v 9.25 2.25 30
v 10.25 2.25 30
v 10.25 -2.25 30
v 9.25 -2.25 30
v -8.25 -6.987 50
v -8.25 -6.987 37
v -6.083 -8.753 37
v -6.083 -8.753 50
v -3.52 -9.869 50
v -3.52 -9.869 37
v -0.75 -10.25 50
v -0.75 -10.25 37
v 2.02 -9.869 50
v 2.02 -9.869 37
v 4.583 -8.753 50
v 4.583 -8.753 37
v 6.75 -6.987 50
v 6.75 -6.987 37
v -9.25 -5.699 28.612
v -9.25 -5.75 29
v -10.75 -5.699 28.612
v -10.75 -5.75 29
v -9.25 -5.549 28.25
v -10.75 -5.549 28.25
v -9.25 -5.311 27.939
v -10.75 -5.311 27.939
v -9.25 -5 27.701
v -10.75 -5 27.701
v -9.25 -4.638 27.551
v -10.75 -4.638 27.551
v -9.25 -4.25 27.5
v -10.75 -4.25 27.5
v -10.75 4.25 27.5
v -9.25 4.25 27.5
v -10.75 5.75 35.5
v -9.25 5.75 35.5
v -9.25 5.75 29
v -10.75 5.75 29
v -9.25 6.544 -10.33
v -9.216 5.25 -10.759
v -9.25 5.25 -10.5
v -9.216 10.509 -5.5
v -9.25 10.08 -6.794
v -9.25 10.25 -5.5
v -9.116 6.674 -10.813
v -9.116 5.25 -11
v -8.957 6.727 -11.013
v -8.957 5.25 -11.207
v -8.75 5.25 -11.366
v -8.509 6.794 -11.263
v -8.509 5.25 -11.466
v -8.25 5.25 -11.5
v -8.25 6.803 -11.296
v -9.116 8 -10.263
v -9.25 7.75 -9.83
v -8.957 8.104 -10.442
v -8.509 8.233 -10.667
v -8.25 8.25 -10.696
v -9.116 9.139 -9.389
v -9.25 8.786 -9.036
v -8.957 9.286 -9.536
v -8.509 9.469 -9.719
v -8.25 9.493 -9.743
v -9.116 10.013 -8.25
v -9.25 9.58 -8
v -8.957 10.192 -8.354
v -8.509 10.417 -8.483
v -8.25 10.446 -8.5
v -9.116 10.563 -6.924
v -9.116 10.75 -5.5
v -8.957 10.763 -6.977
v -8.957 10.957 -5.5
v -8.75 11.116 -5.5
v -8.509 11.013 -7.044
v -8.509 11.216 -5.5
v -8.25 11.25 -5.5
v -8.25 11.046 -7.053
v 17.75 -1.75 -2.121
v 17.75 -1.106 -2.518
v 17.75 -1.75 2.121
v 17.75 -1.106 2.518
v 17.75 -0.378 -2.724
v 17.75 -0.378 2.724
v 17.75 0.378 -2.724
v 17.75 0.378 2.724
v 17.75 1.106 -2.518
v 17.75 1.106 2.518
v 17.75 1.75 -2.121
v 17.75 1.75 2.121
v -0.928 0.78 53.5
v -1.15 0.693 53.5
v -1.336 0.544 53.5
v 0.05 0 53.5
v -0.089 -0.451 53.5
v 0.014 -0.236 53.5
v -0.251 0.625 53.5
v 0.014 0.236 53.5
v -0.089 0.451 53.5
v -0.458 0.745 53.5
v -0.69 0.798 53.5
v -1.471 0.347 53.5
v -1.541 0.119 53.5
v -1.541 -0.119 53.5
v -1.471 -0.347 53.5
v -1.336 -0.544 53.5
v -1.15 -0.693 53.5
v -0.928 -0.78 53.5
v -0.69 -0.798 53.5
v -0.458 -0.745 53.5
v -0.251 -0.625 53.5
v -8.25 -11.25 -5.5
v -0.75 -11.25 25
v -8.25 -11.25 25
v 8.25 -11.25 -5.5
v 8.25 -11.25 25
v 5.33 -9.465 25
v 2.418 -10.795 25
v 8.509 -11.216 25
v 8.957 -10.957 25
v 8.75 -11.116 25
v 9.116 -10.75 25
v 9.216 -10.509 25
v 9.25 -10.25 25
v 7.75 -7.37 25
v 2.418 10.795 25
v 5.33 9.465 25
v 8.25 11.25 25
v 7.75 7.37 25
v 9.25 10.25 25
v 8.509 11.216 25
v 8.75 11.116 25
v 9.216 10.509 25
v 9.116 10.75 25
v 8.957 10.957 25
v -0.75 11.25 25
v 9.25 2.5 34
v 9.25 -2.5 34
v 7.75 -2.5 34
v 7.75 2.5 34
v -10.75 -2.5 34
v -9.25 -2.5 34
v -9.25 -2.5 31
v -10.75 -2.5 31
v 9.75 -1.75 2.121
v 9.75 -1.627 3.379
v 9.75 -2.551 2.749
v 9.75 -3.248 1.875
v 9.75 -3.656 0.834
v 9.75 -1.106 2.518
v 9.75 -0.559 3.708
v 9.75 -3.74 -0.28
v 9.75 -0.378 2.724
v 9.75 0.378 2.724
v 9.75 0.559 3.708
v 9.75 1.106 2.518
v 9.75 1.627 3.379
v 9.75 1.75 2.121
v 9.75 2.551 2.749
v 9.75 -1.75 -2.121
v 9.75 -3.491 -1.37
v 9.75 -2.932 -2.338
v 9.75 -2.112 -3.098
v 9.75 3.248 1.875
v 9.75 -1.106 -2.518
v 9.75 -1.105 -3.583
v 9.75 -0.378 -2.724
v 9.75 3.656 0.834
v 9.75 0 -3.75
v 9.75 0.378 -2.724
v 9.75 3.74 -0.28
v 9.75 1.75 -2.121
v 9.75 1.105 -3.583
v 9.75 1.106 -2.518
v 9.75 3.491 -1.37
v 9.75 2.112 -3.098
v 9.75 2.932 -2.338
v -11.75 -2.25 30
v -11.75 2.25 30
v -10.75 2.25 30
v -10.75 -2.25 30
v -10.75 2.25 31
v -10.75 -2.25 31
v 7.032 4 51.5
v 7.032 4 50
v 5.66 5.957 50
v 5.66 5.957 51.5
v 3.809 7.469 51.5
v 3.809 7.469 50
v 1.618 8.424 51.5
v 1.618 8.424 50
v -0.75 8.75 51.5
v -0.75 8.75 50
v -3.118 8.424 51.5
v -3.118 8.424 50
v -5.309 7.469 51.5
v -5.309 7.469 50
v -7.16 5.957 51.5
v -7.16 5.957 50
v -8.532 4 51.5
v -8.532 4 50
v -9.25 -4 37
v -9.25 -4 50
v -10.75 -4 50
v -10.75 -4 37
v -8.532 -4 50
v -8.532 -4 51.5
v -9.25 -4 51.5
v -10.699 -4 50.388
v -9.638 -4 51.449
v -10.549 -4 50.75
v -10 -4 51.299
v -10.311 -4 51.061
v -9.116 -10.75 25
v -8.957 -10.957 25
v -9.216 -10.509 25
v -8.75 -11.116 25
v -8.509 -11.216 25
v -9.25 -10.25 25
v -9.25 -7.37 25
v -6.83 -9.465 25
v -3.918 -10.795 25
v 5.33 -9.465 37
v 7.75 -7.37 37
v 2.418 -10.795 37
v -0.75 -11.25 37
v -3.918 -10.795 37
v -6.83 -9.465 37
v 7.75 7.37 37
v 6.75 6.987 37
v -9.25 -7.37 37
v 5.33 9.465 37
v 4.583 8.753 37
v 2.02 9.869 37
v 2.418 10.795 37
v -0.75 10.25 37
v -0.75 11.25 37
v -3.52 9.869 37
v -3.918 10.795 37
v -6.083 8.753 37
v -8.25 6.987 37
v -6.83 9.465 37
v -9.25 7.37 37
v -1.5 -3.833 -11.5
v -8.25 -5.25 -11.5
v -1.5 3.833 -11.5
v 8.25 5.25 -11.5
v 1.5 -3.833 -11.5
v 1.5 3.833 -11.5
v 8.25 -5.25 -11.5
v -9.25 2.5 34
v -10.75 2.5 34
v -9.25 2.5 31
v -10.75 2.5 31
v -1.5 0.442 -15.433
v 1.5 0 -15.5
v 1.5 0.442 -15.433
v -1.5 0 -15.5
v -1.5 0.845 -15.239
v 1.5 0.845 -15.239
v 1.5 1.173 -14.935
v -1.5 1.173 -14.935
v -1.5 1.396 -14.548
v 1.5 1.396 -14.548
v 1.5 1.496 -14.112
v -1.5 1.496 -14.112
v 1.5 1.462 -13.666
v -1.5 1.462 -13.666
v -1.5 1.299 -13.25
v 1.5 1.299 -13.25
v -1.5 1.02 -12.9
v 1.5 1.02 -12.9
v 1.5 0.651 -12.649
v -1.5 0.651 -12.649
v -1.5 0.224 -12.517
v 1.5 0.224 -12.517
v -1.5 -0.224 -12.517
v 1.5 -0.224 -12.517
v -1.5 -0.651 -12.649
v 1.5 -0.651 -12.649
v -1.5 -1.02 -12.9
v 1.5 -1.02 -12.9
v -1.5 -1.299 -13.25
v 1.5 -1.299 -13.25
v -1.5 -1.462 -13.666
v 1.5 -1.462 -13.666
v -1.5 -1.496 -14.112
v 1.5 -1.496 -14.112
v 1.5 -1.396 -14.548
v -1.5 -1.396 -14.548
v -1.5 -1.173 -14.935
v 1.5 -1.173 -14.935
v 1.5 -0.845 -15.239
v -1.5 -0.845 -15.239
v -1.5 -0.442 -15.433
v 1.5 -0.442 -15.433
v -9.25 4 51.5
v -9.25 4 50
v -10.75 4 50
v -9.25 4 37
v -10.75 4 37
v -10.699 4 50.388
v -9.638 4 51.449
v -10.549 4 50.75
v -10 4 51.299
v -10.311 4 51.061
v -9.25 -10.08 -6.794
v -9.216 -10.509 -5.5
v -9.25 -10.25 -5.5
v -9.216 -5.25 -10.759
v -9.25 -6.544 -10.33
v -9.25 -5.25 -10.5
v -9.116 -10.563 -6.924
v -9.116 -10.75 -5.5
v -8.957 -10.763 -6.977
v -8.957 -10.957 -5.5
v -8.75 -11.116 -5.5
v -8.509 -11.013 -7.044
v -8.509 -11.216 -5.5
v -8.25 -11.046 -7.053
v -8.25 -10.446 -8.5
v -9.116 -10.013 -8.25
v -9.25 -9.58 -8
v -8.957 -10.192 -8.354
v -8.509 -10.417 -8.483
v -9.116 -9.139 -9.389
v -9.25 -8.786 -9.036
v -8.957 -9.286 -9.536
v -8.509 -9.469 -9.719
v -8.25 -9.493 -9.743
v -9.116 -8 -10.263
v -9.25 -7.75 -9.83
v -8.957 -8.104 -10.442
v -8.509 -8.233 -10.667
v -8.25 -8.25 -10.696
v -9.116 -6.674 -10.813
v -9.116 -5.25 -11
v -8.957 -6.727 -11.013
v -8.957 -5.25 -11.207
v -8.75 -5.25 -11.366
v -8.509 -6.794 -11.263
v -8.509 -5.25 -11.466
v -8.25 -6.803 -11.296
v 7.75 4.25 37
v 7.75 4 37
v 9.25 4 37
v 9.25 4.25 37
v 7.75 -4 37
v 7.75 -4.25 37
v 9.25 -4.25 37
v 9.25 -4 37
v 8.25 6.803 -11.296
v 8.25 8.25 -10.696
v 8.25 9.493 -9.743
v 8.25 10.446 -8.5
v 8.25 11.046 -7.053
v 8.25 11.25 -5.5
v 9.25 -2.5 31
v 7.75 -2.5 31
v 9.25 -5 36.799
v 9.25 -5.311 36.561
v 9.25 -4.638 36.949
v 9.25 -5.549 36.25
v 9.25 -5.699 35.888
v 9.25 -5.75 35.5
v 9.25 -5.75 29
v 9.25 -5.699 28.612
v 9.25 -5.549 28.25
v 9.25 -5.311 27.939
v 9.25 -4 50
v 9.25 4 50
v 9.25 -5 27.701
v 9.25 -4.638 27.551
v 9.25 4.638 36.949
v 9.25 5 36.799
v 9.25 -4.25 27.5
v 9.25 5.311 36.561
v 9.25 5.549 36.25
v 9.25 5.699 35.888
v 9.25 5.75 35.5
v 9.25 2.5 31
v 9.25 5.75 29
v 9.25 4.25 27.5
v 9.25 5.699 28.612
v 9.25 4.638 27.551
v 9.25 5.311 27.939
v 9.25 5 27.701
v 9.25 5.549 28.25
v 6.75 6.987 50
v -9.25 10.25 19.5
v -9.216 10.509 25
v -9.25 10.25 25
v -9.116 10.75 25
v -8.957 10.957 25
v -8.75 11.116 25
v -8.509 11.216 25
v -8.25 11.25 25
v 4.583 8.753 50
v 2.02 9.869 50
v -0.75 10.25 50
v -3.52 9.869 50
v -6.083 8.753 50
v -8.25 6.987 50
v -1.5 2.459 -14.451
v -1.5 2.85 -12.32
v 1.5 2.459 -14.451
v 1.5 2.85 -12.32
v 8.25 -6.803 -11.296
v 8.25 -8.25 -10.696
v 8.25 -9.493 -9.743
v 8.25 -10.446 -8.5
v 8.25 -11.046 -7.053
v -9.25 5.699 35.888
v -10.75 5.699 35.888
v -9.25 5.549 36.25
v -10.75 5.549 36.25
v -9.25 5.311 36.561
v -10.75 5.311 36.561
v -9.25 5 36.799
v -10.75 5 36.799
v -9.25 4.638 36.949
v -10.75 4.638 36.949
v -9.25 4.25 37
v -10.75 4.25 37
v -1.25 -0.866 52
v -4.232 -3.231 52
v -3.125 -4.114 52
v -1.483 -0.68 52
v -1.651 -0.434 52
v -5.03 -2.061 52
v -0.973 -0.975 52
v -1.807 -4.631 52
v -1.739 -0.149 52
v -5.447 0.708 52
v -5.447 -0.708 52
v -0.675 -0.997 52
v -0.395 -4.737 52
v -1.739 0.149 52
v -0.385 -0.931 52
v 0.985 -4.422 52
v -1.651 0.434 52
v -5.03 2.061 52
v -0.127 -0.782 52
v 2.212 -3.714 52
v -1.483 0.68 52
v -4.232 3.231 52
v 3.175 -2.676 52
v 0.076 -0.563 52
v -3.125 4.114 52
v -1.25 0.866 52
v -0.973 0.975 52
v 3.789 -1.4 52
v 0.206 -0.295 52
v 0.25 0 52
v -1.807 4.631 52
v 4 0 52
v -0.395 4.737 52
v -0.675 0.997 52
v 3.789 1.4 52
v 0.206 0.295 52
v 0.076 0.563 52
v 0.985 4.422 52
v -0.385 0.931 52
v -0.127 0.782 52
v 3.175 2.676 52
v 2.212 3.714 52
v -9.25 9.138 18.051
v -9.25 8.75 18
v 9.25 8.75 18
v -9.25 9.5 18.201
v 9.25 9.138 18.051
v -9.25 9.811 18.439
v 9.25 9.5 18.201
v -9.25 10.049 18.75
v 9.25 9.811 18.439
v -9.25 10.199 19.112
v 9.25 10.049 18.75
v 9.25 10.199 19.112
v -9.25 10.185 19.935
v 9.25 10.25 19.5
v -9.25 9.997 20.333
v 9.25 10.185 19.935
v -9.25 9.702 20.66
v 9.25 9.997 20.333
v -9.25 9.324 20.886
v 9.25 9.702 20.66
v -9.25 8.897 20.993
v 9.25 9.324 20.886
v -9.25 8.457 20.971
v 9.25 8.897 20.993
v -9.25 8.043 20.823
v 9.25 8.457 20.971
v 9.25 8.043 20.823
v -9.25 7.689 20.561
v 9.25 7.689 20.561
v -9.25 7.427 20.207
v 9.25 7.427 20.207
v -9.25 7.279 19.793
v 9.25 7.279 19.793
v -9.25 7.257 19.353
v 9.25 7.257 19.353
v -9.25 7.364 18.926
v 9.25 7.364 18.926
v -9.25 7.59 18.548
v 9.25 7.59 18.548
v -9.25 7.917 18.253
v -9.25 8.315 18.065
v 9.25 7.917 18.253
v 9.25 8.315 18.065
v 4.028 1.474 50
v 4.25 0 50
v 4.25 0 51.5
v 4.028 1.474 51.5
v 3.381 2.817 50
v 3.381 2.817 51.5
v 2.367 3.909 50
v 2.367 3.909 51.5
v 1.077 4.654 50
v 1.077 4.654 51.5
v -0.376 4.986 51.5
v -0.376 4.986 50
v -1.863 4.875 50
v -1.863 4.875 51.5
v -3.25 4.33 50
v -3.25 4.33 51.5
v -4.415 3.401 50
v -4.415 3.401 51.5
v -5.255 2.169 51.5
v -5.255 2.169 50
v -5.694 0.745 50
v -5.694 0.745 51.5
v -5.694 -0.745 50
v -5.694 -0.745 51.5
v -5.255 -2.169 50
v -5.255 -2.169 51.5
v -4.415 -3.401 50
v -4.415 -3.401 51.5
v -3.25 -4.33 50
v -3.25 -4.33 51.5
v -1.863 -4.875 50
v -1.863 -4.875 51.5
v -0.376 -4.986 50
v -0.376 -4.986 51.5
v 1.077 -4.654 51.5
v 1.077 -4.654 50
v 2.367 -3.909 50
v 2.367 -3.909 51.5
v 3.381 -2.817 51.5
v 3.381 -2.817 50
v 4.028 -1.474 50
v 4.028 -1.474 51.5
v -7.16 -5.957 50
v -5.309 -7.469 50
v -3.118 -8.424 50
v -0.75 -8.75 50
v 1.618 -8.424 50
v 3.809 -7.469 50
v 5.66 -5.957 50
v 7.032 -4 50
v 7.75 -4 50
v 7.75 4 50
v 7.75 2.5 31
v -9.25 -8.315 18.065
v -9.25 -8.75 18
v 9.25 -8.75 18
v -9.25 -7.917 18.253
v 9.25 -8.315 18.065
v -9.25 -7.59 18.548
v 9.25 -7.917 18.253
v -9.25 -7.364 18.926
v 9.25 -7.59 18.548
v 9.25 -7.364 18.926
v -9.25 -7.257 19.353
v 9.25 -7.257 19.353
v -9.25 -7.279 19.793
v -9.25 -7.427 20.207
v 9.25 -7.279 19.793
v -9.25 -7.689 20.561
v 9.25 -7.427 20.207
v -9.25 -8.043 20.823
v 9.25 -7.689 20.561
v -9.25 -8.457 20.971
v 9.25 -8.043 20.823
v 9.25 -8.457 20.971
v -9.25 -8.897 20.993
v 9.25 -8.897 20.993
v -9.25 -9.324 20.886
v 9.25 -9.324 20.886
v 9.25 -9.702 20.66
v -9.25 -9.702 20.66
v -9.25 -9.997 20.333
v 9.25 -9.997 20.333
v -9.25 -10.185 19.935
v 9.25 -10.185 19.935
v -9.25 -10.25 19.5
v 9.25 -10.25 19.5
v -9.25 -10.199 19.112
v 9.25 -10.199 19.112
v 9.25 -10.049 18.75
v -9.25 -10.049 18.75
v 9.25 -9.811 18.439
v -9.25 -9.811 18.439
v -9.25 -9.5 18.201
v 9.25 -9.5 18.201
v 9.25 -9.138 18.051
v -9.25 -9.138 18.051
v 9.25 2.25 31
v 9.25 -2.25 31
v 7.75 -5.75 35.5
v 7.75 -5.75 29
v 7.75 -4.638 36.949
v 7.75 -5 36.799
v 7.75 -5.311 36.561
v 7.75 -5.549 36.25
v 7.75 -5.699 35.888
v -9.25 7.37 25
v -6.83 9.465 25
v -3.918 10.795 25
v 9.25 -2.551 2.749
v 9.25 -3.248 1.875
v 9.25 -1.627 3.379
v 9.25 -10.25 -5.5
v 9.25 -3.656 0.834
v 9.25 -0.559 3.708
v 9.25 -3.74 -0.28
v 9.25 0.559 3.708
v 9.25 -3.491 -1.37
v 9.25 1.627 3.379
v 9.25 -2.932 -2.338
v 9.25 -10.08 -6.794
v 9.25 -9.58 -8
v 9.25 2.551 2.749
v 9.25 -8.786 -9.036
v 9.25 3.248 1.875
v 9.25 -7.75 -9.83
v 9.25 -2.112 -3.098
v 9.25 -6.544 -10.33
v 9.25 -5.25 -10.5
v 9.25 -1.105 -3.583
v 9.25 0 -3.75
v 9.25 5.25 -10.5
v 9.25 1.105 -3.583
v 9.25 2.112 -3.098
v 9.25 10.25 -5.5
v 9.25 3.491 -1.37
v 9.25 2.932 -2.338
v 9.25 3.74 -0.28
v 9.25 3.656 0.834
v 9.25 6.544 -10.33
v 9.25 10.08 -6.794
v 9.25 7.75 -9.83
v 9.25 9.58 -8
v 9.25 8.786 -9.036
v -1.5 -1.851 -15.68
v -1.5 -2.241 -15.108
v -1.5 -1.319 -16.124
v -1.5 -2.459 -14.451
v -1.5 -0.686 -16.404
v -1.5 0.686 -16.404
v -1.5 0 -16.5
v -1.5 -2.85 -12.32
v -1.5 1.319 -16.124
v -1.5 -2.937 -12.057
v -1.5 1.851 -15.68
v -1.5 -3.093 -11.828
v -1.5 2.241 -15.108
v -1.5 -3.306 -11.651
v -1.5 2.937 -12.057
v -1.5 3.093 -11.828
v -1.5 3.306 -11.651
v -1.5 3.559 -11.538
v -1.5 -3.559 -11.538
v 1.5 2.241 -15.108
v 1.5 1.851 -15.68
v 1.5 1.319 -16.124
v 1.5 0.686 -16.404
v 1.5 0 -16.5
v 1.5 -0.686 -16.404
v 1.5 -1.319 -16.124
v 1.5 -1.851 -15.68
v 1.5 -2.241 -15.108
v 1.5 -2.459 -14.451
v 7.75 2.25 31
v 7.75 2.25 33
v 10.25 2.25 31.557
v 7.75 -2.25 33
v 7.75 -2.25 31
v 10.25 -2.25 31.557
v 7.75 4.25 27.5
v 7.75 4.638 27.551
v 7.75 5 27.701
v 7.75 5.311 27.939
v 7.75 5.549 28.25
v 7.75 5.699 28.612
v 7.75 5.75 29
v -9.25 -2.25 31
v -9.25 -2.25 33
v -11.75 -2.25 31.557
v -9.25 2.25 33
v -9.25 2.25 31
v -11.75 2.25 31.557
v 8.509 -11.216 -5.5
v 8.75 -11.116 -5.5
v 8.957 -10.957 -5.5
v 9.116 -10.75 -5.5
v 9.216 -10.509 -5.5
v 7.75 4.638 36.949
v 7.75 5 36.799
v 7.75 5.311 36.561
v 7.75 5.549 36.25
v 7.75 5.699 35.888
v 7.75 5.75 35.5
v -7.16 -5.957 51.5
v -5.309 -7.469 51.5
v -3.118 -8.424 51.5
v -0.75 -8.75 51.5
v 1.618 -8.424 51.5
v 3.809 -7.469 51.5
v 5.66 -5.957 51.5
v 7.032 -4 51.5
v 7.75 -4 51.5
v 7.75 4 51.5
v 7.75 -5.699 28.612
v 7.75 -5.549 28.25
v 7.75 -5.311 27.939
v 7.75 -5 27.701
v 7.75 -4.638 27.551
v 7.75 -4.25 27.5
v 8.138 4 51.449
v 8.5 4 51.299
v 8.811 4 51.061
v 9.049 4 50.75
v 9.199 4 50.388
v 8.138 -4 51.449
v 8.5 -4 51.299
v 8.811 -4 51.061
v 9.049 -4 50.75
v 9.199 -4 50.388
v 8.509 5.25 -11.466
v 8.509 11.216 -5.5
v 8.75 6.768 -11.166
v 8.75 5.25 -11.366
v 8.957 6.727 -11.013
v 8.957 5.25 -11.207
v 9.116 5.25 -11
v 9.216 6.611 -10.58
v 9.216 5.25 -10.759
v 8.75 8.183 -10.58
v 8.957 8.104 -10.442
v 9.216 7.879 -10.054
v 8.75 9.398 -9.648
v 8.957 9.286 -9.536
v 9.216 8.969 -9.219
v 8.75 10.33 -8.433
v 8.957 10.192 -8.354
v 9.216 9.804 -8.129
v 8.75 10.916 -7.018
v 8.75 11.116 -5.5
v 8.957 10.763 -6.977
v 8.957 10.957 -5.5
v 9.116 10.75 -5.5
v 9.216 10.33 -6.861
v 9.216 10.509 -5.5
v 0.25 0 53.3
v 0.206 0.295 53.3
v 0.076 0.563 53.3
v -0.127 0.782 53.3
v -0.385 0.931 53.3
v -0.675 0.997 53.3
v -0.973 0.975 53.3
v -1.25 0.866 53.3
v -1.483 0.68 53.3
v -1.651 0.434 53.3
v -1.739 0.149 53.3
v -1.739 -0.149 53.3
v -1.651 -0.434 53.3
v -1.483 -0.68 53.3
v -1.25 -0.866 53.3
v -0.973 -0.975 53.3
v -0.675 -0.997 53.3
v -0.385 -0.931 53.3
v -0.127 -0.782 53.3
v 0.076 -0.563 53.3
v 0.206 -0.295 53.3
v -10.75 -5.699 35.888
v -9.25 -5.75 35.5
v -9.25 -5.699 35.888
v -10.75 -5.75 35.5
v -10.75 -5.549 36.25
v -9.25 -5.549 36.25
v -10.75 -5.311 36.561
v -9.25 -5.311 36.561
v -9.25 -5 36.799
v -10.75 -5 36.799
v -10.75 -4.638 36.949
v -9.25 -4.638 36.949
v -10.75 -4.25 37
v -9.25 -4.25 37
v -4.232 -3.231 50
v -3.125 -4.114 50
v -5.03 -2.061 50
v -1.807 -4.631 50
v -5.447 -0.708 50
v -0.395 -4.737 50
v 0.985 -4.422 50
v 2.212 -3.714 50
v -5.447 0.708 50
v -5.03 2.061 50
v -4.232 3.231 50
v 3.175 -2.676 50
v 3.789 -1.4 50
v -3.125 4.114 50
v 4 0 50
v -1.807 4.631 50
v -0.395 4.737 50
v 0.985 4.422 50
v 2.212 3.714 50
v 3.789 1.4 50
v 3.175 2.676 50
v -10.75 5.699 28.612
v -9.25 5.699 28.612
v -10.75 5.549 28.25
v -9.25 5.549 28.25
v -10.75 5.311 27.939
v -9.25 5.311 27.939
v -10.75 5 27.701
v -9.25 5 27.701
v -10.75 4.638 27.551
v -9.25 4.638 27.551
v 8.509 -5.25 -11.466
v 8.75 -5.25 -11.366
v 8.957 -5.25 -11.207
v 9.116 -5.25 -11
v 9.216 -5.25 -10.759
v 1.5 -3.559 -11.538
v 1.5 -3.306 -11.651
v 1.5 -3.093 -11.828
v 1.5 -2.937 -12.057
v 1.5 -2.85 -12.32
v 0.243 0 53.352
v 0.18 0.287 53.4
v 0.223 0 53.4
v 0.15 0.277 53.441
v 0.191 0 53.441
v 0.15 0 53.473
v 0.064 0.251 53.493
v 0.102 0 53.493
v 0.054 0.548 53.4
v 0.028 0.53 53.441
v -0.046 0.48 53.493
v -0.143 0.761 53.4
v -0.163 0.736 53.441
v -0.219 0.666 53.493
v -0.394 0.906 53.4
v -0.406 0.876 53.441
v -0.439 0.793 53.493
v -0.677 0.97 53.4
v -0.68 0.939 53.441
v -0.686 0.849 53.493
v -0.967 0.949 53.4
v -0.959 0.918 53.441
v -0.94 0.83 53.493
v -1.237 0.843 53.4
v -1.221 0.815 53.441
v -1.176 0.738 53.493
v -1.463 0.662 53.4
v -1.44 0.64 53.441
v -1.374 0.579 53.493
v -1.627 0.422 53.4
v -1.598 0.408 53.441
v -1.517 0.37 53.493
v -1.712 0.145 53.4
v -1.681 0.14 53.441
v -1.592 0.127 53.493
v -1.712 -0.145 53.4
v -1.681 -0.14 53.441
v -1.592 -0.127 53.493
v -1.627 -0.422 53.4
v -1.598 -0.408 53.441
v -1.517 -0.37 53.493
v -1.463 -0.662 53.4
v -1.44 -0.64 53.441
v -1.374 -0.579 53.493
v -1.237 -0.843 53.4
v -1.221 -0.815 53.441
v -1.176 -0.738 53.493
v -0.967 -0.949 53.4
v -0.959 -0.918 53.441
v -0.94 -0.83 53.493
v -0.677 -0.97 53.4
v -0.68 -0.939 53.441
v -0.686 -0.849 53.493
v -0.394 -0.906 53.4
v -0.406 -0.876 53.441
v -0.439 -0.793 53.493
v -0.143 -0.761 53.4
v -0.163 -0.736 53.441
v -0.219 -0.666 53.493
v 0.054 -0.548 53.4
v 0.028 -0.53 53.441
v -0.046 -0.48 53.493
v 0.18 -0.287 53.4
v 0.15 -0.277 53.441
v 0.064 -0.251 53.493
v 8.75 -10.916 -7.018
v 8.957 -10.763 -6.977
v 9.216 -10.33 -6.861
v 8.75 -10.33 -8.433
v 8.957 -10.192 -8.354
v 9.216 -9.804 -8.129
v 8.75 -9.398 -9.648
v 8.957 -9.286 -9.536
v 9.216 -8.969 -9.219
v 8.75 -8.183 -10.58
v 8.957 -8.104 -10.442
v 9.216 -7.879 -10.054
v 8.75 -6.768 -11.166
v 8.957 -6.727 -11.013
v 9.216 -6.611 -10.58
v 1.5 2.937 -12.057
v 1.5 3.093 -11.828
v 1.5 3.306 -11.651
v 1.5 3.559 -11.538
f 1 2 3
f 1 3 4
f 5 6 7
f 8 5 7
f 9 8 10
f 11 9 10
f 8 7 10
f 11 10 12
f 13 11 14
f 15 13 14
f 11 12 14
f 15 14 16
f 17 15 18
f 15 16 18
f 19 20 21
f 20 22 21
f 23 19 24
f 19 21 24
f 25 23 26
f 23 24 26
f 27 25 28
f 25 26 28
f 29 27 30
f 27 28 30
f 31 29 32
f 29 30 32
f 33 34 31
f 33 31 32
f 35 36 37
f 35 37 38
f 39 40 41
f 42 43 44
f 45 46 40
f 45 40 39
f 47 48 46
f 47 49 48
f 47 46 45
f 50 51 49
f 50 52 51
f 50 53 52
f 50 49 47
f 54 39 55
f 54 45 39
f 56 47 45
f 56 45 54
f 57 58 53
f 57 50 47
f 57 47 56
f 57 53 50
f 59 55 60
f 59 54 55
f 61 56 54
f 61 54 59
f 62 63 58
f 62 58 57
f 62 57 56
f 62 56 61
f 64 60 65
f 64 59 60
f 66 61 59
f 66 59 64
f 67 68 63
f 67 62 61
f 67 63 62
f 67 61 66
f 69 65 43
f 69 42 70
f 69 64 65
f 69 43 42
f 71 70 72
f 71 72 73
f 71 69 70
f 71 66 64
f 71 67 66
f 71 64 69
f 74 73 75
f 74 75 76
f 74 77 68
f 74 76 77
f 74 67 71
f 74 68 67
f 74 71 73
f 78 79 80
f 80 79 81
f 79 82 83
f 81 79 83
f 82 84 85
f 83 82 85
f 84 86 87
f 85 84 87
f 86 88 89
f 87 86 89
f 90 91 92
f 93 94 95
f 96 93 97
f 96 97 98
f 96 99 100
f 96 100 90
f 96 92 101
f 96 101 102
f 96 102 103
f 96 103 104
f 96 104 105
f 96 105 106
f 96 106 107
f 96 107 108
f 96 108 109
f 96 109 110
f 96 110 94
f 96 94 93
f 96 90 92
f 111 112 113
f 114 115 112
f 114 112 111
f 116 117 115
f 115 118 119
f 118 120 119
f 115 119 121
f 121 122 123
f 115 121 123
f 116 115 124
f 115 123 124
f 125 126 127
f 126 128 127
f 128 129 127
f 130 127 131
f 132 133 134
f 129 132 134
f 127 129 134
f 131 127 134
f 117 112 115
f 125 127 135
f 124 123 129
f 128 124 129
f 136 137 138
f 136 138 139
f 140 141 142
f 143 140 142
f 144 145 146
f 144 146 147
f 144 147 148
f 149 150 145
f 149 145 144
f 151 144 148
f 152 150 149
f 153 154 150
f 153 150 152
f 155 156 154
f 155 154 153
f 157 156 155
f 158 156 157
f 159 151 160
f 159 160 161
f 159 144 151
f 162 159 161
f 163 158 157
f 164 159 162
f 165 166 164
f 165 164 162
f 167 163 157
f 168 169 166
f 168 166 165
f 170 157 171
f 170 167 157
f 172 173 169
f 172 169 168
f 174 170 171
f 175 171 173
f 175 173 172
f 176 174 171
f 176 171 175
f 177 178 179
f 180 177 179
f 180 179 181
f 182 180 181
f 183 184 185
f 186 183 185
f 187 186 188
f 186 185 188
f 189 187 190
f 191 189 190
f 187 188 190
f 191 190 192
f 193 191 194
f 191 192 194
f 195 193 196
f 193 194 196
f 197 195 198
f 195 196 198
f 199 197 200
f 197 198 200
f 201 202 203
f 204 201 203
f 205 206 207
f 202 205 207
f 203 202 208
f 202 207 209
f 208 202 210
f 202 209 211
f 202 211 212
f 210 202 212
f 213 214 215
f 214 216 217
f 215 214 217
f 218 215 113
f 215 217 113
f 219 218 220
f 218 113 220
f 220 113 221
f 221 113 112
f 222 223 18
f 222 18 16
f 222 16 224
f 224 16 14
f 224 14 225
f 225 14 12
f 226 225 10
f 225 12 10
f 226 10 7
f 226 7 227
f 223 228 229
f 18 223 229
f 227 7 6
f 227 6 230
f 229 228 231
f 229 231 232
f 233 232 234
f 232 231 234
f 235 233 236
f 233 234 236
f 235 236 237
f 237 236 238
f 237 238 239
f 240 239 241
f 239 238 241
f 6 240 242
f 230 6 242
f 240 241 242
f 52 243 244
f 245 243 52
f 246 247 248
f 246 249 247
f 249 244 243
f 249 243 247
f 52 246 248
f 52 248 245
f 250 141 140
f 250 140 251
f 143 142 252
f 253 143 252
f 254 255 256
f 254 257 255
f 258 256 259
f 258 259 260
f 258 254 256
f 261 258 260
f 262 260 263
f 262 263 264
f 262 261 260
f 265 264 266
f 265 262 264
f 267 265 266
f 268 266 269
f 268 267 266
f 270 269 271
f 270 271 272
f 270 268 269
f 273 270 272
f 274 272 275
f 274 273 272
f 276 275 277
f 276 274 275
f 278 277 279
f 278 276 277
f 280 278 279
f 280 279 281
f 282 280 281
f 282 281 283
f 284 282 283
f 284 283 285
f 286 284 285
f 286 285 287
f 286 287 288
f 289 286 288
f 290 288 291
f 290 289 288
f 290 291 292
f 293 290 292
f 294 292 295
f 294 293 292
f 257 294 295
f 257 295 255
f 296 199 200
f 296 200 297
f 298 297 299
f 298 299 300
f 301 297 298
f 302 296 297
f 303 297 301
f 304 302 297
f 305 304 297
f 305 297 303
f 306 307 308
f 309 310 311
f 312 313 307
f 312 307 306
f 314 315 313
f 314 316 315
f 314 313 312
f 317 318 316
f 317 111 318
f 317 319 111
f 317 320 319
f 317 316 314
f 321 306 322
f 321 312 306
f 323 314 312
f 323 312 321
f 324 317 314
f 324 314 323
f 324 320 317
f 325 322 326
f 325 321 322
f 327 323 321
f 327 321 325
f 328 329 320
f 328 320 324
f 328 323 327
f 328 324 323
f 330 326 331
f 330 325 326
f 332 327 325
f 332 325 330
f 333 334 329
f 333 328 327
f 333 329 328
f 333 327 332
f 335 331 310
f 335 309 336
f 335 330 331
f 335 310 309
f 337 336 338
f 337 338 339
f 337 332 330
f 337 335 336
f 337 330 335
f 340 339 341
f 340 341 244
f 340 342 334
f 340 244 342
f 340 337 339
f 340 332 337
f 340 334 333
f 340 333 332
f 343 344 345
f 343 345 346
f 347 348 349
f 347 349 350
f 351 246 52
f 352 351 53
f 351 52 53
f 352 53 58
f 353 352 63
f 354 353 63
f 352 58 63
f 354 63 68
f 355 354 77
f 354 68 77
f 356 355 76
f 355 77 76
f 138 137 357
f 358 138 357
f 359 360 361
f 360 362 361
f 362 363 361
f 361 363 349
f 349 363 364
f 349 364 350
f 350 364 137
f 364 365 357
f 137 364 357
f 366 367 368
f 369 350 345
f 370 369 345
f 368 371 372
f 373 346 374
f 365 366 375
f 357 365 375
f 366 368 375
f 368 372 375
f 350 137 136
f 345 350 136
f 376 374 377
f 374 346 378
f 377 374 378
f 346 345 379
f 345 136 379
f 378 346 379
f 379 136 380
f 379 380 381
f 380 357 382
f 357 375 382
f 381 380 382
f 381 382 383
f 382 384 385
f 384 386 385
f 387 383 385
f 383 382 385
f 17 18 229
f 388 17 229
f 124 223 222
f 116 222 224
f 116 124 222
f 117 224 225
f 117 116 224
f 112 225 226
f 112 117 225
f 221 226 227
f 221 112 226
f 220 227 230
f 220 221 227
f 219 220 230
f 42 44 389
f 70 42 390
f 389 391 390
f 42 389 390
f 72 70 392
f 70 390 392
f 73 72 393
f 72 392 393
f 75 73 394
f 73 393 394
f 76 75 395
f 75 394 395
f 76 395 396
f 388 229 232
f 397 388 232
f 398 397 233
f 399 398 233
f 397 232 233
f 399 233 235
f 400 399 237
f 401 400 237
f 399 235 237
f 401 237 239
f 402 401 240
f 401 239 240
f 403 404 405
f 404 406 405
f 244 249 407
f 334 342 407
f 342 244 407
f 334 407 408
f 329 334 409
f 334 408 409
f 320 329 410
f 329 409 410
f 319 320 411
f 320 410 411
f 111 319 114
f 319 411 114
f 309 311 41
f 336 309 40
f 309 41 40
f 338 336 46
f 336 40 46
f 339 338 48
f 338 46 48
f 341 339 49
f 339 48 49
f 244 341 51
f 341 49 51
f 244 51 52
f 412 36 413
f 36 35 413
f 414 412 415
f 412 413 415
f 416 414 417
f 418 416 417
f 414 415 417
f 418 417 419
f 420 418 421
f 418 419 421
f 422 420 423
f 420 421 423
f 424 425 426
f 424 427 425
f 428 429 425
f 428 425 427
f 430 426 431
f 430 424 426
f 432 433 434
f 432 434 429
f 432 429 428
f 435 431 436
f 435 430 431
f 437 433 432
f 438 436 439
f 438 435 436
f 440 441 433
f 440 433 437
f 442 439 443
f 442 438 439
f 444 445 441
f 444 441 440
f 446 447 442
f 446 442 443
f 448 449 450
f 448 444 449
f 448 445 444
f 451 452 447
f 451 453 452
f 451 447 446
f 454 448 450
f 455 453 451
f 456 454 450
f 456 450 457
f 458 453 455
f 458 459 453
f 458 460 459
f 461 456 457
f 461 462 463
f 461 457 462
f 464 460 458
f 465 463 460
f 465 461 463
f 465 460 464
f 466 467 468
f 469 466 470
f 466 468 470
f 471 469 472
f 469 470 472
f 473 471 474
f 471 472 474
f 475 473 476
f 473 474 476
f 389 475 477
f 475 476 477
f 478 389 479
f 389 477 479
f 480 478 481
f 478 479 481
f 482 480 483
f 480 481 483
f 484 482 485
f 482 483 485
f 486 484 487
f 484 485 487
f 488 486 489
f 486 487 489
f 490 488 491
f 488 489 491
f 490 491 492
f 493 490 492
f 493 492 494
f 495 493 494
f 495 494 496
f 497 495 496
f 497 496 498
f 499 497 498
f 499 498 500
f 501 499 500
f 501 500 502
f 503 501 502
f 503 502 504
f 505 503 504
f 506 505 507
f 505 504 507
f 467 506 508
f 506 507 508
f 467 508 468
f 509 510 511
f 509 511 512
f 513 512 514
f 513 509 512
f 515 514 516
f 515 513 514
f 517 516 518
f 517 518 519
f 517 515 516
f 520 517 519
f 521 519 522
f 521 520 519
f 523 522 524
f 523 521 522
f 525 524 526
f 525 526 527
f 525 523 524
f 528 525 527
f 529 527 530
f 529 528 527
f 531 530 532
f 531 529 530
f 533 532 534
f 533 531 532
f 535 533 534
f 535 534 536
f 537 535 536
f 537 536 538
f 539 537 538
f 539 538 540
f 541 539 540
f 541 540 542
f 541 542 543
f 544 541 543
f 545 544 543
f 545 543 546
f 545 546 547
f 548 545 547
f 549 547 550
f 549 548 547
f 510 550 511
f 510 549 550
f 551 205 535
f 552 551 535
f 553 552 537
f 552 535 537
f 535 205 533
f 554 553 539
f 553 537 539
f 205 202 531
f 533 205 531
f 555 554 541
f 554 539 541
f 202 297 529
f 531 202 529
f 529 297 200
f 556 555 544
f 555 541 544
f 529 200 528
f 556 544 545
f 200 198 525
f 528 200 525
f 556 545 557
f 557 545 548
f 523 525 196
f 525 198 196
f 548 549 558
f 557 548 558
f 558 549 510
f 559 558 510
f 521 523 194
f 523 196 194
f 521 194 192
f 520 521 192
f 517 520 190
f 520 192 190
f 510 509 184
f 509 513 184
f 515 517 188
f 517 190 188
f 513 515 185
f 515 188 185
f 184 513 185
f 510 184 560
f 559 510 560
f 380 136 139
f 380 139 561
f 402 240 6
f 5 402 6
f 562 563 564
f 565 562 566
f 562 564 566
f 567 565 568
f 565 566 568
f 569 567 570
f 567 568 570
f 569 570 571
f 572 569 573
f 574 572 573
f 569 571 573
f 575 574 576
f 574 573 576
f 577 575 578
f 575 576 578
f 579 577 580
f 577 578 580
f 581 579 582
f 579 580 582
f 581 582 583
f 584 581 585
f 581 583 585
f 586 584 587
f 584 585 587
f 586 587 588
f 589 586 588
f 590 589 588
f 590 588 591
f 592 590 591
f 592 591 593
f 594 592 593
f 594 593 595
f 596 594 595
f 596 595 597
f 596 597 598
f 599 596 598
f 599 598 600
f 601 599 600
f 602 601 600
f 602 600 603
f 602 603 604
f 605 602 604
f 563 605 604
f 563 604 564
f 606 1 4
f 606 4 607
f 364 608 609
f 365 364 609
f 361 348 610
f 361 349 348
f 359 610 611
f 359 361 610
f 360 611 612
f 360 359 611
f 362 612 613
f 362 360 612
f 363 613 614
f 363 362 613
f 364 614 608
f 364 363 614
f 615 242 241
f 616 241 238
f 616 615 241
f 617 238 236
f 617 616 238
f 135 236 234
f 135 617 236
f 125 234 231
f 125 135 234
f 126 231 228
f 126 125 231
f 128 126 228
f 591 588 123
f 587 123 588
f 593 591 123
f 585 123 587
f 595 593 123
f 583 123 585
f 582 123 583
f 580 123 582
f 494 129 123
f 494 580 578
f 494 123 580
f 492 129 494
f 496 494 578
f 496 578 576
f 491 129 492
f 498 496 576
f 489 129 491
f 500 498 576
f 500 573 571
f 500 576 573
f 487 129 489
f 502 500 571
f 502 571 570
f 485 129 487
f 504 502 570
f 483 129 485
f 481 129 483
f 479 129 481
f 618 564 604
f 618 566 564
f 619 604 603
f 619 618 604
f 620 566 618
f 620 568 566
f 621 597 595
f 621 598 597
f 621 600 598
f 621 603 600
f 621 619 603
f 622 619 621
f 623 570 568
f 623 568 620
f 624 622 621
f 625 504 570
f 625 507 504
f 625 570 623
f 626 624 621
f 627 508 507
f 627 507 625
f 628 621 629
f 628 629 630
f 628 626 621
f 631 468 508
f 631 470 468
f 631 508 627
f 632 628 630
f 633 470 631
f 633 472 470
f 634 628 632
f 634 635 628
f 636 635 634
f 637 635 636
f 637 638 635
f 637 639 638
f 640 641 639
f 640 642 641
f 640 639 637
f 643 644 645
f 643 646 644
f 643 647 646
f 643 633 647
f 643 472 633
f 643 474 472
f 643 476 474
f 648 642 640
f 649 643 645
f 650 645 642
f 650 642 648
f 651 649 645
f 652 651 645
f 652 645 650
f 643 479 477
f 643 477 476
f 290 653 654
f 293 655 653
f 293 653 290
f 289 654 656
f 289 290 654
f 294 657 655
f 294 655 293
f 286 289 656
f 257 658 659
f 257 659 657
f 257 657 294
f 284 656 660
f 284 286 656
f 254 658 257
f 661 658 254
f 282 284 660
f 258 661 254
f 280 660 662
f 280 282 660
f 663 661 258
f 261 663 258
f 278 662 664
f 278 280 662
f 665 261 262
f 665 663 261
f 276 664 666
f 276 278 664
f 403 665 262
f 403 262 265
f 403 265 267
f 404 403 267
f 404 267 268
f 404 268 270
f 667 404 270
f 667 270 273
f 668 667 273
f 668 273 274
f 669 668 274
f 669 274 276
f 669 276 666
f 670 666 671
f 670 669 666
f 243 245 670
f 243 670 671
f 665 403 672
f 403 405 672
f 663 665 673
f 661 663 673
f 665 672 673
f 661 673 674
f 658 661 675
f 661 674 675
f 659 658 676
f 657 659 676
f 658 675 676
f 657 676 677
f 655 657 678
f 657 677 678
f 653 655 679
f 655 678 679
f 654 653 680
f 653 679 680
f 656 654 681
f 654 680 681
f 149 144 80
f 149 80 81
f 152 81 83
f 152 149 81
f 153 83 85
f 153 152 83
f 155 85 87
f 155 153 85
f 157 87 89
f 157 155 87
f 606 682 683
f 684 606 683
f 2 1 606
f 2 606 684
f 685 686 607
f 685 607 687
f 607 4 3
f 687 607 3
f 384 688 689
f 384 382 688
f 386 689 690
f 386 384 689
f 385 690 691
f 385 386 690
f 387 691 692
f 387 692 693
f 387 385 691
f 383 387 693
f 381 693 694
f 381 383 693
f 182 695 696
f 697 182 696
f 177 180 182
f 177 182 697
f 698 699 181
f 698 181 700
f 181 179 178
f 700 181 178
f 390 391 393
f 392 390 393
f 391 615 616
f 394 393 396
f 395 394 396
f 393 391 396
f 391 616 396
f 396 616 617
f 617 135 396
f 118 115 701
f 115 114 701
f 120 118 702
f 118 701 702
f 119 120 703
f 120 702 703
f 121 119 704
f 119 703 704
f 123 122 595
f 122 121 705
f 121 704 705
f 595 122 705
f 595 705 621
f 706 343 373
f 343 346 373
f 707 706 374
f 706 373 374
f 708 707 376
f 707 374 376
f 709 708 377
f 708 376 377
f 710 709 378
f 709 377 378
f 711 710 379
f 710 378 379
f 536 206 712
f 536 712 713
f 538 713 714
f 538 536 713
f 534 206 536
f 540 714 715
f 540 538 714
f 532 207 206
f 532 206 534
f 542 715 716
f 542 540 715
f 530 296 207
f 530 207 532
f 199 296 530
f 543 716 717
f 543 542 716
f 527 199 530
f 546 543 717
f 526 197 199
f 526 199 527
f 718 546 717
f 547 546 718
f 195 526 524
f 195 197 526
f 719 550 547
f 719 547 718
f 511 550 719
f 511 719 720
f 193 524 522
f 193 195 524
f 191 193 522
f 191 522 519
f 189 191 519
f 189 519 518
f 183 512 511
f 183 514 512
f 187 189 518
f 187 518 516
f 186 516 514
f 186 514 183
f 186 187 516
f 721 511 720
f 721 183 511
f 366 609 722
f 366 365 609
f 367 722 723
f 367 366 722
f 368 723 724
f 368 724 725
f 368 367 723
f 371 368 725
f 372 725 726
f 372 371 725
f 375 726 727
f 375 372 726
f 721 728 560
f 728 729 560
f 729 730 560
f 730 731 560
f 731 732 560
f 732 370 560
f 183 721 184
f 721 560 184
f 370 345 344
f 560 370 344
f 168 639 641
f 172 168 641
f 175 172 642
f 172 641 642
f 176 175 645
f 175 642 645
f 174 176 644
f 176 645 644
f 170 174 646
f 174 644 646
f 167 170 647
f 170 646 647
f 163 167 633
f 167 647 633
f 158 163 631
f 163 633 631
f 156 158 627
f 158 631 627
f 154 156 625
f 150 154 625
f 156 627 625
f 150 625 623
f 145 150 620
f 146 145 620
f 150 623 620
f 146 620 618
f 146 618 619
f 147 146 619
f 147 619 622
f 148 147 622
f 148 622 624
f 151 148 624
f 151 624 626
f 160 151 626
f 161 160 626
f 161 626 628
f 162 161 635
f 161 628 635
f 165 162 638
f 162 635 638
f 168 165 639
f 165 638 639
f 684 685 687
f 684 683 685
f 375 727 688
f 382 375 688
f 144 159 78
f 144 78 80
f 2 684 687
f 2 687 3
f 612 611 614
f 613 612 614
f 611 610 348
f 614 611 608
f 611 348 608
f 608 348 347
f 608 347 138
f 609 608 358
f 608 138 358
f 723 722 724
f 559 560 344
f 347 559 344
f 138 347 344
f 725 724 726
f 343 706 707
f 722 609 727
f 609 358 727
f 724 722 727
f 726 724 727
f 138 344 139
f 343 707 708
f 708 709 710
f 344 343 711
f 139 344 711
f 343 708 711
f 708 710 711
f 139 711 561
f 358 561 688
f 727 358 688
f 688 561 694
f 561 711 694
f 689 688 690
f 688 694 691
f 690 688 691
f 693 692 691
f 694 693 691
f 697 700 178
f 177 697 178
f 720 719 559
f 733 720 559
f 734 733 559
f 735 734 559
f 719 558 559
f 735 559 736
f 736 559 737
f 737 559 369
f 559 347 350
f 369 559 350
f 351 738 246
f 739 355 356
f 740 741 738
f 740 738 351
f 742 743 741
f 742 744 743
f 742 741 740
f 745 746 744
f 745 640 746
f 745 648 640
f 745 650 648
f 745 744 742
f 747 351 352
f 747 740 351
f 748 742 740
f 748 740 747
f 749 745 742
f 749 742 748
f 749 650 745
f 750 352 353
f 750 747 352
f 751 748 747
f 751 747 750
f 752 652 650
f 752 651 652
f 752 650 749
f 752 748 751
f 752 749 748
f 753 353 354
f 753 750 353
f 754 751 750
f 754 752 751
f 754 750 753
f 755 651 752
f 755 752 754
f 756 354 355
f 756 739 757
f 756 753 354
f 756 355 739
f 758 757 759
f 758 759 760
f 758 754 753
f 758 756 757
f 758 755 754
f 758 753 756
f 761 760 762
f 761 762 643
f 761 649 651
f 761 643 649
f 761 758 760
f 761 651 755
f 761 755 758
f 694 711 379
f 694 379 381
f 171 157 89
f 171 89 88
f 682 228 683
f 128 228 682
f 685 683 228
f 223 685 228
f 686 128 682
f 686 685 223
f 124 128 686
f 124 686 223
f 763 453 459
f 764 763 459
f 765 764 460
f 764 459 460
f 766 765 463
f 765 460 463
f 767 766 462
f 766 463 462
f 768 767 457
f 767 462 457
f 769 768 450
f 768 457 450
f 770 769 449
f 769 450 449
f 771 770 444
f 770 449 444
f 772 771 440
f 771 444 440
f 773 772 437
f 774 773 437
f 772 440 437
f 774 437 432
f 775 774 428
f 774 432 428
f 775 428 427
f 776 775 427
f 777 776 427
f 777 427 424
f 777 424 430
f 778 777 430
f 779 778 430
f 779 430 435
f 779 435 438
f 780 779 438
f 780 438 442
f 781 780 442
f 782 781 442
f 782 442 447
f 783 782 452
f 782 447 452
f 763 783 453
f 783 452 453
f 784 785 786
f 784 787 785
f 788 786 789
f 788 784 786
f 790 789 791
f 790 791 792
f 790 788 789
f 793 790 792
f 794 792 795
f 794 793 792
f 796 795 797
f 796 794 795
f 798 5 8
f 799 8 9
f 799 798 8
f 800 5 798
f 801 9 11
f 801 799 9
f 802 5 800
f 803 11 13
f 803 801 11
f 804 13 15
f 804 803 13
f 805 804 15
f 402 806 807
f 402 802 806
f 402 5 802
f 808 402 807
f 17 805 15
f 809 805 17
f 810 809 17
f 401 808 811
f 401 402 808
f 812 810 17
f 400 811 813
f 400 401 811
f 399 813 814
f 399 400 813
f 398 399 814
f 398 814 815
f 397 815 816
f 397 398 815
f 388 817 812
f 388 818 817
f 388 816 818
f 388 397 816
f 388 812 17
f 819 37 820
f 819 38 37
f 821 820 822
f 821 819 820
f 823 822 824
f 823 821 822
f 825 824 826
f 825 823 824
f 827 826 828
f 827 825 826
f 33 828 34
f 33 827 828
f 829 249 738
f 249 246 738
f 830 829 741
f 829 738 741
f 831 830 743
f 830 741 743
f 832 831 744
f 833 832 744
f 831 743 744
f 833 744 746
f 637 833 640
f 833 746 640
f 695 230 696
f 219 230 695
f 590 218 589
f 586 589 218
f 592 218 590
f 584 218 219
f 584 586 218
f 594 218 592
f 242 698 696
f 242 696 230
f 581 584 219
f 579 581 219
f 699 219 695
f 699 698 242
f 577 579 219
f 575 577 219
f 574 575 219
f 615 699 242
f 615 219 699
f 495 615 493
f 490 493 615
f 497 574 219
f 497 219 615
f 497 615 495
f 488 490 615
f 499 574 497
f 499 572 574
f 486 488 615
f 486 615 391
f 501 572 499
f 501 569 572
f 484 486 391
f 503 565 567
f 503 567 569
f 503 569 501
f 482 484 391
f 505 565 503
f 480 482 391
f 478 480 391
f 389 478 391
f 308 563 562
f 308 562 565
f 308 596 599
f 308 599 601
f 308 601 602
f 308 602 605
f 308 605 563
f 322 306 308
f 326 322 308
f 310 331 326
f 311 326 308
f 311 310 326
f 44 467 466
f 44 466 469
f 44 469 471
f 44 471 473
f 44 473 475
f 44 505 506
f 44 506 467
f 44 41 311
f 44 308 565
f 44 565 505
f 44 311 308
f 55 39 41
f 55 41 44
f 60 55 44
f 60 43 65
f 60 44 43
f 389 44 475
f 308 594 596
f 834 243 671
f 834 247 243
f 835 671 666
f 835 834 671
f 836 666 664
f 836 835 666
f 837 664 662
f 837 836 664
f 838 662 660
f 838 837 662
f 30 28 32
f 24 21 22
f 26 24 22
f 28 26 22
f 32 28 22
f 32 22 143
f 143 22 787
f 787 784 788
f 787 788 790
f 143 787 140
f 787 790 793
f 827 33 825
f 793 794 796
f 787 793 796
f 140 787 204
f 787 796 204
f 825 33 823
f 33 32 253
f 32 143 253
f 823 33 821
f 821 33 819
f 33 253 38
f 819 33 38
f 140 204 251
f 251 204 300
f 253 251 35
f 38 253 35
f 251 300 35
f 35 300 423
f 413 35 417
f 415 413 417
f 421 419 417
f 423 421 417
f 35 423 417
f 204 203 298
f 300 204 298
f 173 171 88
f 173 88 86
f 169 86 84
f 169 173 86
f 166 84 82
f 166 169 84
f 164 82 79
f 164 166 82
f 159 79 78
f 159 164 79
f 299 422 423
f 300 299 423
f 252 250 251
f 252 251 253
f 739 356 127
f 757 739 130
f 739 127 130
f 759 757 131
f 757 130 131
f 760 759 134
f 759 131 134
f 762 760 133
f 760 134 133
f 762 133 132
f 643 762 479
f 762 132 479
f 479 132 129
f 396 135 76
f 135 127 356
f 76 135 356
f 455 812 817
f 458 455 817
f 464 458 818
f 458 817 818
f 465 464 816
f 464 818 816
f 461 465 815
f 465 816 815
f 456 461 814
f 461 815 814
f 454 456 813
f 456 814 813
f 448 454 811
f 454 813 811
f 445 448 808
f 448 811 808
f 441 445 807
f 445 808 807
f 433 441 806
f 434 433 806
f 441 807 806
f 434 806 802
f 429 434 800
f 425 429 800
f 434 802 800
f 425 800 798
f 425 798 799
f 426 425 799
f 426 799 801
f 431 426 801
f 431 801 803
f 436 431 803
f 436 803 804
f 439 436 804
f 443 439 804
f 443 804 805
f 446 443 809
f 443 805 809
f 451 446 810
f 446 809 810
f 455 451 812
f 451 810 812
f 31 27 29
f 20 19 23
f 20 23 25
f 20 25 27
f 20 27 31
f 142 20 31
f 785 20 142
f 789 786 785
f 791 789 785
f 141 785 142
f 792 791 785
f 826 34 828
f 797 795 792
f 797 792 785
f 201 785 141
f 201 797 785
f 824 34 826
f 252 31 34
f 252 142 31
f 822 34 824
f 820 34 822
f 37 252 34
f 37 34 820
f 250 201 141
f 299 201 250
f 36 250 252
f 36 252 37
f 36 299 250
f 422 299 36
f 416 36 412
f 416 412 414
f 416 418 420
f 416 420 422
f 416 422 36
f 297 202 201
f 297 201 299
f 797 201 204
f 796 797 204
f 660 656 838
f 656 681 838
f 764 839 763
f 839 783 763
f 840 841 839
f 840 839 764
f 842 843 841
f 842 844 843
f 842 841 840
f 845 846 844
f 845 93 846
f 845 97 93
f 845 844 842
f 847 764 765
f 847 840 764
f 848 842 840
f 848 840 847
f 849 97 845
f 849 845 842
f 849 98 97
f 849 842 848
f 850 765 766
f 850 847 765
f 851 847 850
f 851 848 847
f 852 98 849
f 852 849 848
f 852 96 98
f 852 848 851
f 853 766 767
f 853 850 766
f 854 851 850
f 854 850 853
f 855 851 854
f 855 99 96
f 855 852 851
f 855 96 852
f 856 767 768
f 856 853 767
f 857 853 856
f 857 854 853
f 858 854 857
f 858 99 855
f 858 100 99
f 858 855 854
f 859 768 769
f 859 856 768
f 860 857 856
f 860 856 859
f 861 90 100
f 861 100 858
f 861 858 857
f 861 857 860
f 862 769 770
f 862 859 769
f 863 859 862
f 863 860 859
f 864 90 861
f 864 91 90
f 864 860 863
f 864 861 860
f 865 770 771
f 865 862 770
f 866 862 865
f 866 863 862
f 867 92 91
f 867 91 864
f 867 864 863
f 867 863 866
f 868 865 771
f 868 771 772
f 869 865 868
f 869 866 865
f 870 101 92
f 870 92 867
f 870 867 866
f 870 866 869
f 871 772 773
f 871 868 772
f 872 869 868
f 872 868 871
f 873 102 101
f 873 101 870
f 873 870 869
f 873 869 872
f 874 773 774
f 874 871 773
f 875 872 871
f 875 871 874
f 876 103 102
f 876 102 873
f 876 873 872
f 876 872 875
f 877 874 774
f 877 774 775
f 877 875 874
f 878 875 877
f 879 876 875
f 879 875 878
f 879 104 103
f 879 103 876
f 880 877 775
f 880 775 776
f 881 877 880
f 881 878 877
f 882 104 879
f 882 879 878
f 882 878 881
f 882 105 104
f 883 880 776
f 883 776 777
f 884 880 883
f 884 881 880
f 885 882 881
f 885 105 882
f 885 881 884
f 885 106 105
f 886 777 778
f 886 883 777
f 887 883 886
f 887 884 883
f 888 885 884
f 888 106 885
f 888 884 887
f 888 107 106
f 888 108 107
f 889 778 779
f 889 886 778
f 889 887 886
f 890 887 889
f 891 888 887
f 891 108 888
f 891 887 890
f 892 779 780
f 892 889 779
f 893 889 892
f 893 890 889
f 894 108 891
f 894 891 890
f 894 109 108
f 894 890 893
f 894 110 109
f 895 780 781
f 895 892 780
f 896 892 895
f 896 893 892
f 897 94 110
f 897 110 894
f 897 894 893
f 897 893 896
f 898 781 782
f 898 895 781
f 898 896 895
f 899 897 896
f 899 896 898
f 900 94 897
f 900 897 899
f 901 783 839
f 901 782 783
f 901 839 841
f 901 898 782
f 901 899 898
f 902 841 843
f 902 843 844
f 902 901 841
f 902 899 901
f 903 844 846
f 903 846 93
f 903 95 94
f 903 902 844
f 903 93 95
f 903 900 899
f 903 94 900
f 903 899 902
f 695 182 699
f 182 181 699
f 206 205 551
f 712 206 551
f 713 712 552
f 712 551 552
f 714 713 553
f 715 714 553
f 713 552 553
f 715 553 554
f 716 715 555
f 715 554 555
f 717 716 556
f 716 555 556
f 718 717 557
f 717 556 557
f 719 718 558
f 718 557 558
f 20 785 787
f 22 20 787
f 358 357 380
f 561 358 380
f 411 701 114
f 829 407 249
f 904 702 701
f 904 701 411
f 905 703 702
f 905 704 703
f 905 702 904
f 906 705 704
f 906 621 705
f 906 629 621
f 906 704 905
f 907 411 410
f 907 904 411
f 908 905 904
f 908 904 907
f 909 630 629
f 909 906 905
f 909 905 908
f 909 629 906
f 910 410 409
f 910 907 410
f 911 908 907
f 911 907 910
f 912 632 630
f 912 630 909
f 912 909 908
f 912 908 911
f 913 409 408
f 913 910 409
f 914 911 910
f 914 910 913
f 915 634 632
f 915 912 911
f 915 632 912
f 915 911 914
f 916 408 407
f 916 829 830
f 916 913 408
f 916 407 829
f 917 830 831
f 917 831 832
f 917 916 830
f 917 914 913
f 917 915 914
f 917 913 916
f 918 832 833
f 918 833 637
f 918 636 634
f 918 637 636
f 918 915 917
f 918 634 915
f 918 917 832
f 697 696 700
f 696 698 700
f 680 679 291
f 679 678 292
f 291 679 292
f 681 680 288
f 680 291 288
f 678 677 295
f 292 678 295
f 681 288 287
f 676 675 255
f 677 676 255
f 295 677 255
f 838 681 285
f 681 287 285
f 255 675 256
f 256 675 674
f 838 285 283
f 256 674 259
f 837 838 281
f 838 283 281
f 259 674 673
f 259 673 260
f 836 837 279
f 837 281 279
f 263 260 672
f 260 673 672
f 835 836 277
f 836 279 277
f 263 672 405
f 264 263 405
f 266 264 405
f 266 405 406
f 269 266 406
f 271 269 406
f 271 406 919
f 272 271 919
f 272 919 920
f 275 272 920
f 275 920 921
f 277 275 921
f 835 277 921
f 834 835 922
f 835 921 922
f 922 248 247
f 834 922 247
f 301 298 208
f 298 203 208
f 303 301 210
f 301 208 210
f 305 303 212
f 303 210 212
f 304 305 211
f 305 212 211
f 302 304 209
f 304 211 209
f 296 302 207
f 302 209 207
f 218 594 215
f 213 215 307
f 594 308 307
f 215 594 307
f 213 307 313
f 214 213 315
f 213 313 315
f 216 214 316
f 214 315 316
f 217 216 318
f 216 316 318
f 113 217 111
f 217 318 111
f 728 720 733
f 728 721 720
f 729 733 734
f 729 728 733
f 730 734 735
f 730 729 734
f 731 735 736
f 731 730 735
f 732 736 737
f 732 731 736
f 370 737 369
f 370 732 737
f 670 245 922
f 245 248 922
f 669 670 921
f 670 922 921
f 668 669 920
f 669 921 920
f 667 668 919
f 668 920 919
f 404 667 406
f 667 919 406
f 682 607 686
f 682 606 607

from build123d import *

# Parameters (mm, degrees)
ESBO_O1_W                 = 36.5
ESBO_O1_H                 = 22.5
RESSALTO_EXTRUS_O1_DEPTH  = 9.25
FILETE1_R                 = 6
RESSALTO_EXTRUS_O2_DEPTH  = 12
RESSALTO_EXTRUS_O3_DEPTH  = 13
ESBO_O4_R                 = 3.75
RESSALTO_EXTRUS_O4_DEPTH  = 0.5
ESBO_O5_W                 = 9.5
ESBO_O5_H                 = 11.5
RESSALTO_EXTRUS_O5_DEPTH  = 1.5
ESBO_O6_W                 = 1.5
ESBO_O6_H                 = 8
RESSALTO_EXTRUS_O6_DEPTH  = 13
ESBO_O8_R                 = 4.75
RESSALTO_EXTRUS_O7_DEPTH  = 2
ESBO_O7_R                 = 5
RESSALTO_EXTRUS_O8_DEPTH  = 1.5
ESBO_O10_W                = 1.5
ESBO_O10_H                = 8
RESSALTO_EXTRUS_O9_DEPTH  = 13
ESBO_O11_W                = 1.5
ESBO_O11_H                = 11.5
RESSALTO_EXTRUS_O10_DEPTH = 9.5
FILETE2_R                 = 1.5
ESBO_O12_W                = 3
ESBO_O12_H                = 5
CORTE_EXTRUS_O1_DEPTH     = 21
RESSALTO_EXTRUS_O11_DEPTH = 2.25
ESBO_O15_R                = 1
RESSALTO_EXTRUS_O12_DEPTH = 1.5
RESSALTO_EXTRUS_O13_DEPTH = 8
FILETE4_R                 = 1
ESBO_O17_R                = 1.5
CORTE_EXTRUS_O2_DEPTH     = 22
ESBO_O19_R                = 1.5
RESSALTO_EXTRUS_O14_DEPTH = 1.5
FILETE5_R                 = 1
FILETE6_R                 = 0.2


with BuildPart() as part:
    # Esboço1 → Ressalto-extrusão1 (new body, symmetric)
    with BuildSketch(Plane(origin=(0, 0, 0), x_dir=(0, 0, -1), z_dir=(1, 0, 0))):
        with Locations((-6.75, 0)):
            Rectangle(ESBO_O1_W, ESBO_O1_H)
    extrude(amount=RESSALTO_EXTRUS_O1_DEPTH, both=True)

    # Filete1
    filete1_edges = [part.edges().sort_by_distance(p)[0] for p in [
        (0, -11.25, -11.5),
        (0, 11.25, -11.5),
    ]]
    fillet(filete1_edges, radius=FILETE1_R)

    # Esboço2 → Ressalto-extrusão2 (add)
    with BuildSketch(Plane.XY.offset(25)):
        with BuildLine():
            Line((7.75, 7.369701486), (7.75, -7.369701486))
            ThreePointArc((7.75, -7.369701486), (-0.75, -11.25), (-9.25, -7.369701486))
            Line((-9.25, -7.369701486), (-9.25, 7.369701486))
            ThreePointArc((-9.25, 7.369701486), (-0.75, 11.25), (7.75, 7.369701486))
        make_face()
    extrude(amount=RESSALTO_EXTRUS_O2_DEPTH)

    # Esboço3 → Ressalto-extrusão3 (add)
    with BuildSketch(Plane.XY.offset(37)):
        with BuildLine():
            Line((-8.25, 6.986594306), (-8.25, -6.986594306))
            ThreePointArc((-8.25, -6.986594306), (-0.75, -10.25), (6.75, -6.986594306))
            Line((6.75, -6.986594306), (6.75, 6.986594306))
            ThreePointArc((6.75, 6.986594306), (-0.75, 10.25), (-8.25, 6.986594306))
        make_face()
    extrude(amount=RESSALTO_EXTRUS_O3_DEPTH)

    # Esboço4 → Ressalto-extrusão4 (add)
    with BuildSketch(Plane(origin=(9.25, 0, 0), x_dir=(0, 0, -1), z_dir=(1, 0, 0))):
        Circle(ESBO_O4_R)
    extrude(amount=RESSALTO_EXTRUS_O4_DEPTH)

    # Esboço8 → Ressalto-extrusão7 (add)
    with BuildSketch(Plane.XY.offset(50)):
        with Locations((-0.75, 0)):
            Circle(ESBO_O8_R)
    extrude(amount=RESSALTO_EXTRUS_O7_DEPTH)

    # Esboço14 → Ressalto-extrusão11 (add, symmetric)
    with BuildSketch(Plane(origin=(0, 0, 0), x_dir=(1, 0, 0), z_dir=(0, 1, 0))):
        Polygon((7.75, -33), (10.25, -31.556624327), (10.25, -30), (9.25, -30), (9.25, -31), (7.75, -31), align=None)
    ressalto_extrus_o11 = extrude(amount=RESSALTO_EXTRUS_O11_DEPTH, both=True)

    # Espelhar6: Ressalto-extrusão11 across plane
    add(ressalto_extrus_o11.mirror(Plane(origin=(-0.75, 8.75, 51.5), x_dir=(0, 0, 1), z_dir=(-1, 0, 0))))

    # Esboço15 → Ressalto-extrusão12 (add)
    with BuildSketch(Plane.XY.offset(52)):
        with Locations((-0.75, 0)):
            Circle(ESBO_O15_R)
    extrude(amount=RESSALTO_EXTRUS_O12_DEPTH)

    # Esboço16 → Ressalto-extrusão13 (add)
    with BuildSketch(Plane(origin=(9.75, 0, 0), x_dir=(0, 0, -1), z_dir=(1, 0, 0))):
        with BuildLine():
            Line((-2.121320344, 1.75), (2.121320344, 1.75))
            ThreePointArc((2.121320344, 1.75), (2.75, 0), (2.121320344, -1.75))
            Line((2.121320344, -1.75), (-2.121320344, -1.75))
            ThreePointArc((-2.121320344, -1.75), (-2.75, 0), (-2.121320344, 1.75))
        make_face()
    extrude(amount=RESSALTO_EXTRUS_O13_DEPTH)

    # Filete4
    filete4_edges = [part.edges().sort_by_distance(p)[0] for p in [
        (-9.25, -11.25, 9.75),
        (9.25, -11.25, 9.75),
        (9.25, -9.492640687, -9.742640687),
        (-9.25, -9.492640687, -9.742640687),
        (9.25, 0, -11.5),
        (-9.25, 0, -11.5),
        (9.25, 9.492640687, -9.742640687),
        (-9.25, 9.492640687, -9.742640687),
        (9.25, 11.25, 9.75),
        (-9.25, 11.25, 9.75),
    ]]
    fillet(filete4_edges, radius=FILETE4_R)

    # Esboço17 → Corte-extrusão2 (cut, through all)
    with BuildSketch(Plane(origin=(9.25, 0, 0), x_dir=(0, 0, -1), z_dir=(1, 0, 0))):
        with Locations((-19.5, 8.75)):
            Circle(ESBO_O17_R)
        with Locations((-19.5, -8.75)):
            Circle(ESBO_O17_R)
    extrude(amount=-CORTE_EXTRUS_O2_DEPTH, mode=Mode.SUBTRACT)

    # Esboço19 → Ressalto-extrusão14 (add, symmetric)
    with BuildSketch(Plane(origin=(0, 0, 0), x_dir=(0, 0, -1), z_dir=(1, 0, 0))):
        with BuildLine():
            Line((11.5, 3), (14.450819672, 2.459016393))
            ThreePointArc((14.450819672, 2.459016393), (16.5, 0), (14.450819672, -2.459016393))
            Line((14.450819672, -2.459016393), (11.5, -3))
            Line((11.5, -3), (11.5, 3))
        make_face()
        with Locations((14, 0)):
            Circle(ESBO_O19_R, mode=Mode.SUBTRACT)
    extrude(amount=RESSALTO_EXTRUS_O14_DEPTH, both=True)

    # Filete5
    filete5_edges = [part.edges().sort_by_distance(p)[0] for p in [
        (0, 3, -11.5),
        (0, -3, -11.5),
    ]]
    fillet(filete5_edges, radius=FILETE5_R)

    # Filete6
    filete6_edges = [part.edges().sort_by_distance(p)[0] for p in [
        (-1.75, 0, 53.5),
    ]]
    fillet(filete6_edges, radius=FILETE6_R)


with BuildPart() as body_2:
    # Esboço5 → Ressalto-extrusão5 (new body)
    with BuildSketch(Plane(origin=(7.75, 0, 0), x_dir=(0, 0, -1), z_dir=(1, 0, 0))):
        with Locations((-32.25, 0)):
            Rectangle(ESBO_O5_W, ESBO_O5_H)
    extrude(amount=RESSALTO_EXTRUS_O5_DEPTH)

    # Esboço6 → Ressalto-extrusão6 (add)
    with BuildSketch(Plane.XY.offset(37)):
        with Locations((8.5, 0)):
            Rectangle(ESBO_O6_W, ESBO_O6_H)
    extrude(amount=RESSALTO_EXTRUS_O6_DEPTH)

    # Esboço7 → Ressalto-extrusão8 (add)
    with BuildSketch(Plane.XY.offset(50)):
        with BuildLine():
            Line((9.25, 4), (7.032191208, 4))
            ThreePointArc((7.032191208, 4), (-0.75, 8.75), (-8.532191208, 4))
            Line((-8.532191208, 4), (-10.75, 4))
            Line((-10.75, 4), (-10.75, -4))
            Line((-10.75, -4), (-8.532191208, -4))
            ThreePointArc((-8.532191208, -4), (-0.75, -8.75), (7.032191208, -4))
            Line((7.032191208, -4), (9.25, -4))
            Line((9.25, -4), (9.25, 4))
        make_face()
        with Locations((-0.75, 0)):
            Circle(ESBO_O7_R, mode=Mode.SUBTRACT)
    extrude(amount=RESSALTO_EXTRUS_O8_DEPTH)

    # Esboço10 → Ressalto-extrusão9 (add)
    with BuildSketch(Plane(origin=(0, 0, 50), x_dir=(-1, 0, 0), z_dir=(0, 0, -1))):
        with Locations((10, 0)):
            Rectangle(ESBO_O10_W, ESBO_O10_H)
    extrude(amount=RESSALTO_EXTRUS_O9_DEPTH)

    # Esboço11 → Ressalto-extrusão10 (add)
    with BuildSketch(Plane(origin=(0, 0, 37), x_dir=(-1, 0, 0), z_dir=(0, 0, -1))):
        with Locations((10, 0)):
            Rectangle(ESBO_O11_W, ESBO_O11_H)
    extrude(amount=RESSALTO_EXTRUS_O10_DEPTH)

    # Filete2
    filete2_edges = [body_2.edges().sort_by_distance(p)[0] for p in [
        (8.5, -5.75, 37),
        (8.5, -5.75, 27.5),
        (8.5, 5.75, 27.5),
        (8.5, 5.75, 37),
        (9.25, 0, 51.5),
        (-10.75, 0, 51.5),
        (-10, -5.75, 27.5),
        (-10, -5.75, 37),
        (-10, 5.75, 37),
        (-10, 5.75, 27.5),
    ]]
    fillet(filete2_edges, radius=FILETE2_R)

    # Esboço12 → Corte-extrusão1 (cut, through all)
    with BuildSketch(Plane(origin=(9.25, 0, 0), x_dir=(0, 0, -1), z_dir=(1, 0, 0))):
        with Locations((-32.5, 0)):
            Rectangle(ESBO_O12_W, ESBO_O12_H)
    extrude(amount=-CORTE_EXTRUS_O1_DEPTH, mode=Mode.SUBTRACT)


solid = Compound([part.part, body_2.part])
